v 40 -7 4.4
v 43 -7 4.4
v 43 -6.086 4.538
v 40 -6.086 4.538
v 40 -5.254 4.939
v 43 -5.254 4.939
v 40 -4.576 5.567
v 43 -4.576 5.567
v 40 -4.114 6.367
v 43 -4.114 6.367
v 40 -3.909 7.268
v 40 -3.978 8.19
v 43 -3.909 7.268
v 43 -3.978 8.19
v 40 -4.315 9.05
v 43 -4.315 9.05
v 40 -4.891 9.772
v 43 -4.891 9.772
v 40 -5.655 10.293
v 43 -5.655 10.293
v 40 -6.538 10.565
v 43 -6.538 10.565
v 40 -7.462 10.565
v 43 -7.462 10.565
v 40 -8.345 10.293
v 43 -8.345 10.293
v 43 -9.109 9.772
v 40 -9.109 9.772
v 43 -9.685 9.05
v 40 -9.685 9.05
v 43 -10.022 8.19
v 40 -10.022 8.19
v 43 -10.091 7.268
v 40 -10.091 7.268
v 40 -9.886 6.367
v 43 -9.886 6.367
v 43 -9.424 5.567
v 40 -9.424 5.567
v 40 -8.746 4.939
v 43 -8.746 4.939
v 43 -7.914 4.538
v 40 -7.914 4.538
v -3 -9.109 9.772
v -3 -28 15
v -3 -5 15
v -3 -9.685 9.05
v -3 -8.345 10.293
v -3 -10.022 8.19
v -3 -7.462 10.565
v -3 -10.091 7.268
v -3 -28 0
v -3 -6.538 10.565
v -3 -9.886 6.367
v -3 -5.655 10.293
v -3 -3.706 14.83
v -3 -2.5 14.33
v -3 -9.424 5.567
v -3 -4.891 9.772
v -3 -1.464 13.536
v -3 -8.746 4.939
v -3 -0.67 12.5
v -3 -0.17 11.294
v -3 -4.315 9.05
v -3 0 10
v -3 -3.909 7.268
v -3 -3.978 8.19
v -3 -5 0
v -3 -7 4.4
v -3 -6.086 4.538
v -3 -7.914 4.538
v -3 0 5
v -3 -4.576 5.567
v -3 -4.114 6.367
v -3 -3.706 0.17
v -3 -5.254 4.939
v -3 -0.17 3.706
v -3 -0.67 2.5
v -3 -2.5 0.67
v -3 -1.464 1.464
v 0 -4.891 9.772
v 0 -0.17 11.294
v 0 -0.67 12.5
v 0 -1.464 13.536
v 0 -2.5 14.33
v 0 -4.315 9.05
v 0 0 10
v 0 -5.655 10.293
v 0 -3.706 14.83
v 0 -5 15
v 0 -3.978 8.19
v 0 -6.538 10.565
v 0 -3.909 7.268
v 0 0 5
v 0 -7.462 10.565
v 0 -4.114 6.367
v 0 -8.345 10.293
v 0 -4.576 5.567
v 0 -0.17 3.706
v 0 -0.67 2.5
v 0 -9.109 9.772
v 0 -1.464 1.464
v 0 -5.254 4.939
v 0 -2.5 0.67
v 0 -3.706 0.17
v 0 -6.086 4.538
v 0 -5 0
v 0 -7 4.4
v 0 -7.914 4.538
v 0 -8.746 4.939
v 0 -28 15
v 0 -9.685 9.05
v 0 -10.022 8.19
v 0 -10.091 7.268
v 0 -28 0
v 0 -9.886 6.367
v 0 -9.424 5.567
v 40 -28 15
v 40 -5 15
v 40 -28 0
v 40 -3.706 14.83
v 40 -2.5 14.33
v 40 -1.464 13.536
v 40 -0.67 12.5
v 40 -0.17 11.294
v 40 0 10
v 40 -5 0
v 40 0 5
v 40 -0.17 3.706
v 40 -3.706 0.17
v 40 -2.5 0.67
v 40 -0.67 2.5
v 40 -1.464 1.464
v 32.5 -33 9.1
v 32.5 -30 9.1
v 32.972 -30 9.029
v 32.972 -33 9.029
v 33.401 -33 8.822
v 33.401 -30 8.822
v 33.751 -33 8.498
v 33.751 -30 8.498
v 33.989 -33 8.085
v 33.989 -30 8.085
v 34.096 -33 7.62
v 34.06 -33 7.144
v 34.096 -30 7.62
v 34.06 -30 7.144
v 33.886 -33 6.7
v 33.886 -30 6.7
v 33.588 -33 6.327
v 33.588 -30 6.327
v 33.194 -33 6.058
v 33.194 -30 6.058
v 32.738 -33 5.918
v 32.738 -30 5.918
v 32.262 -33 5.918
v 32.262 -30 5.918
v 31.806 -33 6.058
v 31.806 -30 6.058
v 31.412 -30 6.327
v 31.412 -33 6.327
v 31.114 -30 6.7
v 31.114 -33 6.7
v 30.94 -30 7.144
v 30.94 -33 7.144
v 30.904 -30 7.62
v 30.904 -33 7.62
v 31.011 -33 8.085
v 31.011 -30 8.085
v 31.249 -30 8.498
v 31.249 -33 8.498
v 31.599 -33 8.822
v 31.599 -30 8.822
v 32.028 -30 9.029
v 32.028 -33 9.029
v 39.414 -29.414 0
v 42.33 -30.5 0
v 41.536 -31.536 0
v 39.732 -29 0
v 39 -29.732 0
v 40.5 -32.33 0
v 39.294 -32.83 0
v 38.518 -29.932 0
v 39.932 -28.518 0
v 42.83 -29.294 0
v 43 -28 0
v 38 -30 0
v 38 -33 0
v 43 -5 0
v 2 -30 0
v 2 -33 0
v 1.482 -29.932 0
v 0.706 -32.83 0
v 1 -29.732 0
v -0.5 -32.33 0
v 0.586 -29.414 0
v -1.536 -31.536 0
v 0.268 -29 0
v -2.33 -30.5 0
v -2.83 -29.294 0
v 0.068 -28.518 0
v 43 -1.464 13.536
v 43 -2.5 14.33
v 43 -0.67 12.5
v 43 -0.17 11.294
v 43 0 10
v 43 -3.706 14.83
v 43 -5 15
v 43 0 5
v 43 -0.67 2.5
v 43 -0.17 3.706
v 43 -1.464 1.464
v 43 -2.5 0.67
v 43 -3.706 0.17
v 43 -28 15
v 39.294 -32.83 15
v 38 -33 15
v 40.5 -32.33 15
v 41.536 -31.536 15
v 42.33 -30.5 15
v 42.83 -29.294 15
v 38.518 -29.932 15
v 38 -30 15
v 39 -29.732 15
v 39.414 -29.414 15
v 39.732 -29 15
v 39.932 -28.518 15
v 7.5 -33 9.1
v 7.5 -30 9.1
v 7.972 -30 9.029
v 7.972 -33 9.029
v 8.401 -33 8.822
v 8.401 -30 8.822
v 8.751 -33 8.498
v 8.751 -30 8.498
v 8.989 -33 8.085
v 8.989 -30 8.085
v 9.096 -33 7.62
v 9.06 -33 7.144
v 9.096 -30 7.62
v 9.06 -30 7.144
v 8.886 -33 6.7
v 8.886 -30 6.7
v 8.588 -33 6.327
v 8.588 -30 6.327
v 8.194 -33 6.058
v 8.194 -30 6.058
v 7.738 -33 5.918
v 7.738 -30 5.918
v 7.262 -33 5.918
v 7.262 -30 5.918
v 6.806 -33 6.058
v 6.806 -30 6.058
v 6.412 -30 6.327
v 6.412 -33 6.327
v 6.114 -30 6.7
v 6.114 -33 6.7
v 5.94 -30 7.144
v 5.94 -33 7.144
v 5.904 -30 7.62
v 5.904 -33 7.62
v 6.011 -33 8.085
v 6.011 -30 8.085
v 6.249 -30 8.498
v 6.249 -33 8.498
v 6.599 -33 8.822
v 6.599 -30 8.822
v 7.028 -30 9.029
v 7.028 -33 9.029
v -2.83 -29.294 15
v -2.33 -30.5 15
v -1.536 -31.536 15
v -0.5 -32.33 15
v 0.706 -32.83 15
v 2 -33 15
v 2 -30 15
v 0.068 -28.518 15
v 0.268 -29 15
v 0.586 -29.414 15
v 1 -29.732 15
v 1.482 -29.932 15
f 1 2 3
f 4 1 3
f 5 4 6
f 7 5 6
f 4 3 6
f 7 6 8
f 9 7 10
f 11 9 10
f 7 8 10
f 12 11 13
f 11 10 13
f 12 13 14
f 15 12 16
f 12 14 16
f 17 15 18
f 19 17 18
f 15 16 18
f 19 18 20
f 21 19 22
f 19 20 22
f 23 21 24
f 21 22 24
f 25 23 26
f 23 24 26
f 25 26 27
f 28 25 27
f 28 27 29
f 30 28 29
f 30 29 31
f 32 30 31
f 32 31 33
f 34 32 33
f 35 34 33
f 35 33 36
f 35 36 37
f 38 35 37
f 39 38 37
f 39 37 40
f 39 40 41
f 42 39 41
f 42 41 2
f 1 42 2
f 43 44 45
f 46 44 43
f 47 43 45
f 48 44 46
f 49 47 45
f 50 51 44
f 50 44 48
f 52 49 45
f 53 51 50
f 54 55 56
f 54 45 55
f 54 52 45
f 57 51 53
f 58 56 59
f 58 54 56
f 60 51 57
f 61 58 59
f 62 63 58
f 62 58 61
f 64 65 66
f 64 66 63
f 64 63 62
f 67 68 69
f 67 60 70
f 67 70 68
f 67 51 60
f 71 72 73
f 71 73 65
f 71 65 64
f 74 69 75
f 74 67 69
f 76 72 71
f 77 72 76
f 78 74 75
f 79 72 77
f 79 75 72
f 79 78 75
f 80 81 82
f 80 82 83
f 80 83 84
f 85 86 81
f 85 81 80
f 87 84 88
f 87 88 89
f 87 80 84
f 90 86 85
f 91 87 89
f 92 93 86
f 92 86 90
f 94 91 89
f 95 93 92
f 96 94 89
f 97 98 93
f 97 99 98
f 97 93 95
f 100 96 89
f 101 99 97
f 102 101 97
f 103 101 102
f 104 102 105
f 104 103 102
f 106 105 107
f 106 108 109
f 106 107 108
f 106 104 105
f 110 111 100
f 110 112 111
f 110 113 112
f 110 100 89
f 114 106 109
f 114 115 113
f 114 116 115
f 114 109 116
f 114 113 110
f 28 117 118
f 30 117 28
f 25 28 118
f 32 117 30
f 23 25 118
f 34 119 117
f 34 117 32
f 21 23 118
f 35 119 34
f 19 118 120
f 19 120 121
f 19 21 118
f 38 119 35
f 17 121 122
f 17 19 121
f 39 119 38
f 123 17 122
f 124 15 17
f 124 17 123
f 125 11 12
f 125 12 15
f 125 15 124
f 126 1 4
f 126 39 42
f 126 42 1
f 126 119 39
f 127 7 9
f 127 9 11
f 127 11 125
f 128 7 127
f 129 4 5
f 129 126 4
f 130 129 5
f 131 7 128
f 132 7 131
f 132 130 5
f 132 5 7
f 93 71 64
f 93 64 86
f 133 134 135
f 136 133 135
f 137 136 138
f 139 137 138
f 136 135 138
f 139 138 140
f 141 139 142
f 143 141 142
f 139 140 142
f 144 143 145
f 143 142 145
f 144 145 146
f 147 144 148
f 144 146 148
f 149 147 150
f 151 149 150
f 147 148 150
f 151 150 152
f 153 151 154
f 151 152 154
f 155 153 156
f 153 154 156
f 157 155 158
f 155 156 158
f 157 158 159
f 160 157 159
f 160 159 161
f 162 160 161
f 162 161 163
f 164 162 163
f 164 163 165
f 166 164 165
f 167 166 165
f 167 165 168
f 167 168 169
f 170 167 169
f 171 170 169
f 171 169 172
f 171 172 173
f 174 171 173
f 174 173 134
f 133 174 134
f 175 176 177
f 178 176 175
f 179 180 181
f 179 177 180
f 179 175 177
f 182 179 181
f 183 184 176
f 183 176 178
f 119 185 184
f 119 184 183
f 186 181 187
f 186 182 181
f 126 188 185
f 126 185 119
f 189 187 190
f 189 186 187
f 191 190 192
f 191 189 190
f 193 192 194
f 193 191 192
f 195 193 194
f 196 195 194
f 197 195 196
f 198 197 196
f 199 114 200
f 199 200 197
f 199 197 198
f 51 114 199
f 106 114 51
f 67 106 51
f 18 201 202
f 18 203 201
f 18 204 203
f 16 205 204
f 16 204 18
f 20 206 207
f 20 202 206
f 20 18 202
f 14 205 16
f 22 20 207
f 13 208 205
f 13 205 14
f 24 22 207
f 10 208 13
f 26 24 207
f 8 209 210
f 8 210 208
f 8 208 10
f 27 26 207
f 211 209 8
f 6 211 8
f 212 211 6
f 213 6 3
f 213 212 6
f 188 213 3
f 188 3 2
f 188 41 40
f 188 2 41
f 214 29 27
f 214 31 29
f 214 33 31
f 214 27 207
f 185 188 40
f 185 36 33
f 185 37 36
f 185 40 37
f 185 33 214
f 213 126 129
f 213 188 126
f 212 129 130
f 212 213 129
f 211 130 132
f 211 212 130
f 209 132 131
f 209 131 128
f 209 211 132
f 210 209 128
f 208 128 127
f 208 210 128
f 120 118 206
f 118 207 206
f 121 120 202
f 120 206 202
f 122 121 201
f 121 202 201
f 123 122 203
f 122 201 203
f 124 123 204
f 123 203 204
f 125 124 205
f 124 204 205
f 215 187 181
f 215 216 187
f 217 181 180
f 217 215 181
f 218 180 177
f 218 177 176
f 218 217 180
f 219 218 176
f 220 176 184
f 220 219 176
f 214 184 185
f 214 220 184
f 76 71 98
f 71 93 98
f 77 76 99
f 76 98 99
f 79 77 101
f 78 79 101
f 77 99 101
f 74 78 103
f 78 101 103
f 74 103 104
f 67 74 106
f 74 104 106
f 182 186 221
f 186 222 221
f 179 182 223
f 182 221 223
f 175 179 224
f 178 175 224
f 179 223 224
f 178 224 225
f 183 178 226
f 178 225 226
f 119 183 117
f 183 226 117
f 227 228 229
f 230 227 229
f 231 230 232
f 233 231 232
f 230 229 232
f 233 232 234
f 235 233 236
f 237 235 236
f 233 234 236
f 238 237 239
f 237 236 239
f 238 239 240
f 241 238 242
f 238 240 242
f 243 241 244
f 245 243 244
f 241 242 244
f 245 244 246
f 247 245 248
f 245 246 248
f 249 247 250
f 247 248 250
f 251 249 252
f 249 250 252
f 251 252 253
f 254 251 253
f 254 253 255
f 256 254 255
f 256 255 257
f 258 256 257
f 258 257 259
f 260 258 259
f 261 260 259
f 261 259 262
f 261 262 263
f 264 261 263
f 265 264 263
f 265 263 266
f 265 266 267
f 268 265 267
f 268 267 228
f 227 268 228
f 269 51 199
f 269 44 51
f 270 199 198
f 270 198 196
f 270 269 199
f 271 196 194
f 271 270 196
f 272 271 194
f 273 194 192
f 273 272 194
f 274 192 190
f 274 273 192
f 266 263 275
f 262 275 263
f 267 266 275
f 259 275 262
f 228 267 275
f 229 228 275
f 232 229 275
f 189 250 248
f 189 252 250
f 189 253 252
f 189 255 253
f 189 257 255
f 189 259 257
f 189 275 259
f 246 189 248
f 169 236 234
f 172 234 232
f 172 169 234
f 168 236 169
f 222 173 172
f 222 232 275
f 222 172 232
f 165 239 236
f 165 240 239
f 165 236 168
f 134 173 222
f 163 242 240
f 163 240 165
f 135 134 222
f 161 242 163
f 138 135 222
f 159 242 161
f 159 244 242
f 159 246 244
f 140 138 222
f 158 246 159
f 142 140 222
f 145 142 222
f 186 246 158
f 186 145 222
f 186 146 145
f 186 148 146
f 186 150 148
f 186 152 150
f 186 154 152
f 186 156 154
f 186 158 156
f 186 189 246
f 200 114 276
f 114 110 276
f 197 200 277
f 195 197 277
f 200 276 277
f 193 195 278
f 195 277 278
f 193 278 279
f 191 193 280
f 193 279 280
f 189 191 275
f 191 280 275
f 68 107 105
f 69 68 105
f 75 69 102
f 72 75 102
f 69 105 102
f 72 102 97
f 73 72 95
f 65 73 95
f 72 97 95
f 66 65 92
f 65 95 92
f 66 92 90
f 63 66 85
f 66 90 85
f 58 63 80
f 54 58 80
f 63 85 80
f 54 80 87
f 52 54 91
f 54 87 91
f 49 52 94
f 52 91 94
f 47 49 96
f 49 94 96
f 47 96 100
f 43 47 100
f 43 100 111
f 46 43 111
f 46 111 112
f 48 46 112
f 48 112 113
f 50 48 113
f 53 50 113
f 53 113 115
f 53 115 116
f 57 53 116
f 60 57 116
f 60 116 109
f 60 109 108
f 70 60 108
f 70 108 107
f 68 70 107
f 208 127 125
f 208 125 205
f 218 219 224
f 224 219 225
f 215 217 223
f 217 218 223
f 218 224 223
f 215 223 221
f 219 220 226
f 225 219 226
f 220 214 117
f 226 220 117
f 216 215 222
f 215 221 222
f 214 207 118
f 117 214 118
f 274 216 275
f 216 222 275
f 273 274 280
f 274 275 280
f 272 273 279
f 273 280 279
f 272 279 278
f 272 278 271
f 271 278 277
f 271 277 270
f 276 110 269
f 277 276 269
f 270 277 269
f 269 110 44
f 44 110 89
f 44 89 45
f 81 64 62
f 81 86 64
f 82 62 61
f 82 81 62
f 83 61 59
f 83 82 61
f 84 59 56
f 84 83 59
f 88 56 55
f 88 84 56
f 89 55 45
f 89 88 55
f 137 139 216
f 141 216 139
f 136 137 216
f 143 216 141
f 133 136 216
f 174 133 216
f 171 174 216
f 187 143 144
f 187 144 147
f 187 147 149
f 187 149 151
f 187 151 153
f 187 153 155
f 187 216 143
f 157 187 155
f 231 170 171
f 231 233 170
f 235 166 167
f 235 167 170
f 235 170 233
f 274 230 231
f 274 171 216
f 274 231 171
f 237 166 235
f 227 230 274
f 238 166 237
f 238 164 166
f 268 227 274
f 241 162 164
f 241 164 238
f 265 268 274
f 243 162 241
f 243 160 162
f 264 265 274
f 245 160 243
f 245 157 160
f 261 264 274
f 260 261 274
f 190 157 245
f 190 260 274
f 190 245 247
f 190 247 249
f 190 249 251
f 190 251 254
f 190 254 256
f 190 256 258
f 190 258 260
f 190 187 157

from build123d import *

# Parameters (mm, degrees)
EXTRUDE_1_DEPTH     = 15
SKETCH_2_R          = 3.1
CUT_EXTRUDE_1_DEPTH = 59.566201857
FILLET_1_R          = 5
SKETCH_3_R          = 1.6
CUT_EXTRUDE_2_DEPTH = 55.534392818
FILLET_3_R          = 2
FILLET_4_R          = 5


with BuildPart() as part:
    # ｽｹｯﾁ1 → ﾎﾞｽ - 押し出し1 (new body)
    with BuildSketch(Plane.XY):
        Polygon((0, 0), (0, -30), (40, -30), (40, 0), (43, 0), (43, -33), (-3, -33), (-3, 0), align=None)
    extrude(amount=EXTRUDE_1_DEPTH)

    # ｽｹｯﾁ2 → ｶｯﾄ - 押し出し1 (cut, through all)
    with BuildSketch(Plane(origin=(43, 0, 0), x_dir=(0, 0, -1), z_dir=(1, 0, 0))):
        with Locations((-7.5, -7)):
            Circle(SKETCH_2_R)
    extrude(amount=-CUT_EXTRUDE_1_DEPTH, mode=Mode.SUBTRACT)

    # ﾌｨﾚｯﾄ1
    fillet_1_edges = [part.edges().sort_by_distance(p)[0] for p in [
        (-1.5, 0, 0),
        (41.5, 0, 15),
        (-1.5, 0, 15),
        (41.5, 0, 0),
    ]]
    fillet(fillet_1_edges, radius=FILLET_1_R)

    # ｽｹｯﾁ3 → ｶｯﾄ - 押し出し2 (cut, through all)
    with BuildSketch(Plane(origin=(0, -30, 0), x_dir=(1, 0, 0), z_dir=(0, 1, 0))):
        with Locations(Location((7.5, -7.5, 0), (0, 0, 270))):
            Circle(SKETCH_3_R)
        with Locations(Location((32.5, -7.5, 0), (0, 0, 270))):
            Circle(SKETCH_3_R)
    extrude(amount=-CUT_EXTRUDE_2_DEPTH, mode=Mode.SUBTRACT)

    # ﾌｨﾚｯﾄ3
    fillet_3_edges = [part.edges().sort_by_distance(p)[0] for p in [
        (0, -30, 7.5),
        (40, -30, 7.5),
    ]]
    fillet(fillet_3_edges, radius=FILLET_3_R)

    # ﾌｨﾚｯﾄ4
    fillet_4_edges = [part.edges().sort_by_distance(p)[0] for p in [
        (43, -33, 7.5),
        (-3, -33, 7.5),
    ]]
    fillet(fillet_4_edges, radius=FILLET_4_R)


solid = part.part
